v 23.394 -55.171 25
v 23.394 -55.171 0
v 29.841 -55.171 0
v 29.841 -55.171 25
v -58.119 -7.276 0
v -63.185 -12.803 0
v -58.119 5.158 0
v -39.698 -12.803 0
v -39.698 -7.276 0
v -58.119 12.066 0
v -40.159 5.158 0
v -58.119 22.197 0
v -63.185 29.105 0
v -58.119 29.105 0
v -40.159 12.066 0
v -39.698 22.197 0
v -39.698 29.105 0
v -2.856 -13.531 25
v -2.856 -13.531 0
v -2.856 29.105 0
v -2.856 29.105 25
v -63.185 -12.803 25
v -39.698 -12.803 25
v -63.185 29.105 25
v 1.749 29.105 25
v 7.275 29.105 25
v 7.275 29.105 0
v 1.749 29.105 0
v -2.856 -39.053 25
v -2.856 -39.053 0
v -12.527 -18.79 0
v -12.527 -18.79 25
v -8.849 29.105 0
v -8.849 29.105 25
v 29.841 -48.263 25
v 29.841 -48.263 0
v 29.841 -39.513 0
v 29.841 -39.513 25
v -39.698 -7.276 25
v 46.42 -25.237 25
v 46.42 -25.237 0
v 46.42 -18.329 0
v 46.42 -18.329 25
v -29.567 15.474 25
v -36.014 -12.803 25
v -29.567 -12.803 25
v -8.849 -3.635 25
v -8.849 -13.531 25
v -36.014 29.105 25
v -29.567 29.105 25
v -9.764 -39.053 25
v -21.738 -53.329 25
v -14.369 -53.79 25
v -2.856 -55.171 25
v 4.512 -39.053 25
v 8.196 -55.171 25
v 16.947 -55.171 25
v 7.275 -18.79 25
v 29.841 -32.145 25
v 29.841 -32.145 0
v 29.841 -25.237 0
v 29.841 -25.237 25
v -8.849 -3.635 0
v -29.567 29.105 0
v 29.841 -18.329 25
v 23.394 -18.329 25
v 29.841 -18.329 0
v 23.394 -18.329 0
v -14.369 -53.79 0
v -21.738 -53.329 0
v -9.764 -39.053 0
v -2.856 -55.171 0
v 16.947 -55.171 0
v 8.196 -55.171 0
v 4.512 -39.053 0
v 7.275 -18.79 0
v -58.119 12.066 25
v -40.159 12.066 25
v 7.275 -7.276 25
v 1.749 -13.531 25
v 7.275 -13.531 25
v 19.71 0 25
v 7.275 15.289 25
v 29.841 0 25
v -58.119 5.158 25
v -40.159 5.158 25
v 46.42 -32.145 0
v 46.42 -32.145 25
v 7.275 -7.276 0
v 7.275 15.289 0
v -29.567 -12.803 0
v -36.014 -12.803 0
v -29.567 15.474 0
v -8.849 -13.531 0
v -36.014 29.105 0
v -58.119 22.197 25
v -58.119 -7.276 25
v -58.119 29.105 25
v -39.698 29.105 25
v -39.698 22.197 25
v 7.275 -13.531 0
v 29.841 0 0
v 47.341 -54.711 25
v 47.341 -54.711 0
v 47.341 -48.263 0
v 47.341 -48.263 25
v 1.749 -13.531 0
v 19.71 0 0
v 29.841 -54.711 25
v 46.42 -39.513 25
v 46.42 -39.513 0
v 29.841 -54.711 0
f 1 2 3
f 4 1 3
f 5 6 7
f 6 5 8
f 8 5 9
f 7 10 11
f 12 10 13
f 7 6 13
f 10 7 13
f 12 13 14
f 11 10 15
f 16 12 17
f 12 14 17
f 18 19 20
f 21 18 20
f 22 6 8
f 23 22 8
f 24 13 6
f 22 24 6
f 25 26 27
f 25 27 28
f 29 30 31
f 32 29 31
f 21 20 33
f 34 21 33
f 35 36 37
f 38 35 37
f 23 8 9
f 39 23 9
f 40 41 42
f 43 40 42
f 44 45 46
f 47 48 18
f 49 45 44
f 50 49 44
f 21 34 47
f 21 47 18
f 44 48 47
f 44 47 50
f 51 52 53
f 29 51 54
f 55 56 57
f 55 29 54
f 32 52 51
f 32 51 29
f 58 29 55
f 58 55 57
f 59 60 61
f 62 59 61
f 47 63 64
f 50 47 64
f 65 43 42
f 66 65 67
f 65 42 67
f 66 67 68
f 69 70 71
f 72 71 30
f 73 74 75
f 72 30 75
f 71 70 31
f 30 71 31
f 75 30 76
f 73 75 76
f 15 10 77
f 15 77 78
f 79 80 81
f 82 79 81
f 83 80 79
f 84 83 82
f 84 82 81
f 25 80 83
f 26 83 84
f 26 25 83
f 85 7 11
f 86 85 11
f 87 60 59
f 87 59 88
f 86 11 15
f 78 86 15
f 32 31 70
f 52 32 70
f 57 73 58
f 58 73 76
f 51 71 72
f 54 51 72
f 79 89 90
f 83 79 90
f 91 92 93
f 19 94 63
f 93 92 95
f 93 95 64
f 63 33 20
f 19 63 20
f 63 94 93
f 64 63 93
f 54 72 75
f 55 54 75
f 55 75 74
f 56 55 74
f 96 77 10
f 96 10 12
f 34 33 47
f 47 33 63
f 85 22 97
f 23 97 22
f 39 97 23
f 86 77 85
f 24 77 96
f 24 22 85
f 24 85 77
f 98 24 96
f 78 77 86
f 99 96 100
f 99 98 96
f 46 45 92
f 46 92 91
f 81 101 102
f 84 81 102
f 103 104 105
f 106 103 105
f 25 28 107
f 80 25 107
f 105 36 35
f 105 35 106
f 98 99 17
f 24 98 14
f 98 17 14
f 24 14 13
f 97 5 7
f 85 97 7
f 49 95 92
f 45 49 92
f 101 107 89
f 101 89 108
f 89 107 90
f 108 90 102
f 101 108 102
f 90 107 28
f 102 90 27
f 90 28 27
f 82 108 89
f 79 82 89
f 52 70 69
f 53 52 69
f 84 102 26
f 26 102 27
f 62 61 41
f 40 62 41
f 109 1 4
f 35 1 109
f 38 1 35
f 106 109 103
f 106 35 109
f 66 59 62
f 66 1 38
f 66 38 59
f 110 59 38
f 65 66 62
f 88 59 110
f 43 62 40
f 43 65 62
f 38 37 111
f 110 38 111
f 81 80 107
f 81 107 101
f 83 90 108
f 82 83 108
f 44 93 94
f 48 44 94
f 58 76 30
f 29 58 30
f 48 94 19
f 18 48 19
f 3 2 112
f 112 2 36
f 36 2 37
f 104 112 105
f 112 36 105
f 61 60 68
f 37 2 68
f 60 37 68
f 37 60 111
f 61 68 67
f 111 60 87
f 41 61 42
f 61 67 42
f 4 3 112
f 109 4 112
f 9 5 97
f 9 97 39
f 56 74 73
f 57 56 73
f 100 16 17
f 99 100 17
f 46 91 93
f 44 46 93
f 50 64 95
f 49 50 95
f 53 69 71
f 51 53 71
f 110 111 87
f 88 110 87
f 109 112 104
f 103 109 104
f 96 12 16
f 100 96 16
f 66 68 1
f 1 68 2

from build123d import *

# Parameters (mm, degrees)
F0_W     = 18.4210687876
F0_H     = 6.9079007953
F0_H_2   = 5.5263210088
F0_W_2   = 17.9605409503
F0_H_3   = 6.9079003297
F1_DEPTH = 25
F0_W_3   = 16.5789593011
F0_H_4   = 7.36842677
F0_W_4   = 17.5000112504
F0_H_5   = 6.4473748207


with BuildPart() as f1:
    # F0 (on Top) → F1 (new body)
    with BuildSketch(Plane.XY):
        Polygon((-58.1193529069, 29.1052367538), (-63.1851479411, 29.1052367538), (-63.1851479411, -12.8026939929), (-58.1193529069, -12.8026939929), (-58.1193529069, -7.2763729841), (-58.1193529069, 5.1578474231), (-58.1193529069, 12.0657477528), (-58.1193529069, 22.1973359585), align=None)
        with Locations((-48.9088185132, 25.6512863562)):
            Rectangle(F0_W, F0_H)
        with Locations((-48.9088185132, -10.0395334885)):
            Rectangle(F0_W, F0_H_2)
        with Locations((-49.1390824318, 8.6117975879)):
            Rectangle(F0_W_2, F0_H_3)
    extrude(amount=F1_DEPTH)


with BuildPart() as f1b:
    # F0 (on Top) → F1, piece 2 (new body)
    with BuildSketch(Plane.XY):
        Polygon((-29.5666959137, 29.1052367538), (-36.0140688717, 29.1052367538), (-36.0140688717, 24.4999695569), align=None)
        Polygon((-8.8492140264, -3.6347731935), (-29.5666959137, 29.1052367538), (-29.5666959137, 15.4736489803), (-8.8492140264, -13.5308206343), align=None)
        Polygon((-29.5666959137, 15.4736489803), (-29.5666959137, 29.1052367538), (-36.0140688717, 24.4999695569), align=None)
        Polygon((-29.5666959137, 15.4736489803), (-36.0140688717, 24.4999695569), (-36.0140688717, -12.8026939929), (-29.5666959137, -12.8026939929), align=None)
        Polygon((-8.8492140264, 29.1052367538), (-8.8492140264, -3.6347731935), (-4.536448212, -10.4502730901), (-8.8492140264, -13.5308206343), (-2.8561477084, -13.5308206343), (-2.8561477084, 29.1052367538), align=None)
        Polygon((-4.536448212, -10.4502730901), (-8.8492140264, -3.6347731935), (-8.8492140264, -13.5308206343), align=None)
    extrude(amount=F1_DEPTH)


with BuildPart() as f1c:
    # F0 (on Top) → F1, piece 3 (new body)
    with BuildSketch(Plane.XY):
        Polygon((7.2754388675, 29.1052367538), (1.7491192557, 29.1052367538), (1.7491192557, -13.5308206343), (7.2754388675, -13.5308206343), (29.8412498087, 0), align=None)
        Polygon((7.2754388675, -7.2763729841), (7.2754388675, 15.2894351631), (19.709661603, 0), align=None, mode=Mode.SUBTRACT)
    extrude(amount=F1_DEPTH)


with BuildPart() as f1d:
    # F0 (on Top) → F1, piece 4 (new body)
    with BuildSketch(Plane.XY):
        Polygon((-12.5272087753, -18.7895409763), (-21.7377431691, -53.3290430903), (-14.3693154678, -53.7895709276), (-9.7640482709, -39.0527136624), (-2.8561477084, -55.1711507142), (4.5122788288, -39.0527136624), (8.1964936107, -55.1711507142), (16.9465020299, -55.1711507142), (7.2754388675, -18.7895409763), (-2.8561477084, -39.0527136624), align=None)
    extrude(amount=F1_DEPTH)


with BuildPart() as f1e:
    # F0 (on Top) → F1, piece 5 (new body)
    with BuildSketch(Plane.XY):
        Polygon((29.8412498087, -18.329013139), (23.3938731253, -18.329013139), (23.3938731253, -55.1711507142), (29.8412498087, -55.1711507142), (29.8412498087, -54.7106266022), (29.8412498087, -48.2632517815), (29.8412498087, -39.5132414997), (29.8412498087, -32.1448147297), (29.8412498087, -25.2369139344), align=None)
        with Locations((38.1307294592, -21.7829635367)):
            Rectangle(F0_W_3, F0_H)
        with Locations((38.1307294592, -35.8290281147)):
            Rectangle(F0_W_3, F0_H_4)
        with Locations((38.5912554339, -51.4869391918)):
            Rectangle(F0_W_4, F0_H_5)
    extrude(amount=F1_DEPTH)


solid = Compound([f1.part, f1b.part, f1c.part, f1d.part, f1e.part])
